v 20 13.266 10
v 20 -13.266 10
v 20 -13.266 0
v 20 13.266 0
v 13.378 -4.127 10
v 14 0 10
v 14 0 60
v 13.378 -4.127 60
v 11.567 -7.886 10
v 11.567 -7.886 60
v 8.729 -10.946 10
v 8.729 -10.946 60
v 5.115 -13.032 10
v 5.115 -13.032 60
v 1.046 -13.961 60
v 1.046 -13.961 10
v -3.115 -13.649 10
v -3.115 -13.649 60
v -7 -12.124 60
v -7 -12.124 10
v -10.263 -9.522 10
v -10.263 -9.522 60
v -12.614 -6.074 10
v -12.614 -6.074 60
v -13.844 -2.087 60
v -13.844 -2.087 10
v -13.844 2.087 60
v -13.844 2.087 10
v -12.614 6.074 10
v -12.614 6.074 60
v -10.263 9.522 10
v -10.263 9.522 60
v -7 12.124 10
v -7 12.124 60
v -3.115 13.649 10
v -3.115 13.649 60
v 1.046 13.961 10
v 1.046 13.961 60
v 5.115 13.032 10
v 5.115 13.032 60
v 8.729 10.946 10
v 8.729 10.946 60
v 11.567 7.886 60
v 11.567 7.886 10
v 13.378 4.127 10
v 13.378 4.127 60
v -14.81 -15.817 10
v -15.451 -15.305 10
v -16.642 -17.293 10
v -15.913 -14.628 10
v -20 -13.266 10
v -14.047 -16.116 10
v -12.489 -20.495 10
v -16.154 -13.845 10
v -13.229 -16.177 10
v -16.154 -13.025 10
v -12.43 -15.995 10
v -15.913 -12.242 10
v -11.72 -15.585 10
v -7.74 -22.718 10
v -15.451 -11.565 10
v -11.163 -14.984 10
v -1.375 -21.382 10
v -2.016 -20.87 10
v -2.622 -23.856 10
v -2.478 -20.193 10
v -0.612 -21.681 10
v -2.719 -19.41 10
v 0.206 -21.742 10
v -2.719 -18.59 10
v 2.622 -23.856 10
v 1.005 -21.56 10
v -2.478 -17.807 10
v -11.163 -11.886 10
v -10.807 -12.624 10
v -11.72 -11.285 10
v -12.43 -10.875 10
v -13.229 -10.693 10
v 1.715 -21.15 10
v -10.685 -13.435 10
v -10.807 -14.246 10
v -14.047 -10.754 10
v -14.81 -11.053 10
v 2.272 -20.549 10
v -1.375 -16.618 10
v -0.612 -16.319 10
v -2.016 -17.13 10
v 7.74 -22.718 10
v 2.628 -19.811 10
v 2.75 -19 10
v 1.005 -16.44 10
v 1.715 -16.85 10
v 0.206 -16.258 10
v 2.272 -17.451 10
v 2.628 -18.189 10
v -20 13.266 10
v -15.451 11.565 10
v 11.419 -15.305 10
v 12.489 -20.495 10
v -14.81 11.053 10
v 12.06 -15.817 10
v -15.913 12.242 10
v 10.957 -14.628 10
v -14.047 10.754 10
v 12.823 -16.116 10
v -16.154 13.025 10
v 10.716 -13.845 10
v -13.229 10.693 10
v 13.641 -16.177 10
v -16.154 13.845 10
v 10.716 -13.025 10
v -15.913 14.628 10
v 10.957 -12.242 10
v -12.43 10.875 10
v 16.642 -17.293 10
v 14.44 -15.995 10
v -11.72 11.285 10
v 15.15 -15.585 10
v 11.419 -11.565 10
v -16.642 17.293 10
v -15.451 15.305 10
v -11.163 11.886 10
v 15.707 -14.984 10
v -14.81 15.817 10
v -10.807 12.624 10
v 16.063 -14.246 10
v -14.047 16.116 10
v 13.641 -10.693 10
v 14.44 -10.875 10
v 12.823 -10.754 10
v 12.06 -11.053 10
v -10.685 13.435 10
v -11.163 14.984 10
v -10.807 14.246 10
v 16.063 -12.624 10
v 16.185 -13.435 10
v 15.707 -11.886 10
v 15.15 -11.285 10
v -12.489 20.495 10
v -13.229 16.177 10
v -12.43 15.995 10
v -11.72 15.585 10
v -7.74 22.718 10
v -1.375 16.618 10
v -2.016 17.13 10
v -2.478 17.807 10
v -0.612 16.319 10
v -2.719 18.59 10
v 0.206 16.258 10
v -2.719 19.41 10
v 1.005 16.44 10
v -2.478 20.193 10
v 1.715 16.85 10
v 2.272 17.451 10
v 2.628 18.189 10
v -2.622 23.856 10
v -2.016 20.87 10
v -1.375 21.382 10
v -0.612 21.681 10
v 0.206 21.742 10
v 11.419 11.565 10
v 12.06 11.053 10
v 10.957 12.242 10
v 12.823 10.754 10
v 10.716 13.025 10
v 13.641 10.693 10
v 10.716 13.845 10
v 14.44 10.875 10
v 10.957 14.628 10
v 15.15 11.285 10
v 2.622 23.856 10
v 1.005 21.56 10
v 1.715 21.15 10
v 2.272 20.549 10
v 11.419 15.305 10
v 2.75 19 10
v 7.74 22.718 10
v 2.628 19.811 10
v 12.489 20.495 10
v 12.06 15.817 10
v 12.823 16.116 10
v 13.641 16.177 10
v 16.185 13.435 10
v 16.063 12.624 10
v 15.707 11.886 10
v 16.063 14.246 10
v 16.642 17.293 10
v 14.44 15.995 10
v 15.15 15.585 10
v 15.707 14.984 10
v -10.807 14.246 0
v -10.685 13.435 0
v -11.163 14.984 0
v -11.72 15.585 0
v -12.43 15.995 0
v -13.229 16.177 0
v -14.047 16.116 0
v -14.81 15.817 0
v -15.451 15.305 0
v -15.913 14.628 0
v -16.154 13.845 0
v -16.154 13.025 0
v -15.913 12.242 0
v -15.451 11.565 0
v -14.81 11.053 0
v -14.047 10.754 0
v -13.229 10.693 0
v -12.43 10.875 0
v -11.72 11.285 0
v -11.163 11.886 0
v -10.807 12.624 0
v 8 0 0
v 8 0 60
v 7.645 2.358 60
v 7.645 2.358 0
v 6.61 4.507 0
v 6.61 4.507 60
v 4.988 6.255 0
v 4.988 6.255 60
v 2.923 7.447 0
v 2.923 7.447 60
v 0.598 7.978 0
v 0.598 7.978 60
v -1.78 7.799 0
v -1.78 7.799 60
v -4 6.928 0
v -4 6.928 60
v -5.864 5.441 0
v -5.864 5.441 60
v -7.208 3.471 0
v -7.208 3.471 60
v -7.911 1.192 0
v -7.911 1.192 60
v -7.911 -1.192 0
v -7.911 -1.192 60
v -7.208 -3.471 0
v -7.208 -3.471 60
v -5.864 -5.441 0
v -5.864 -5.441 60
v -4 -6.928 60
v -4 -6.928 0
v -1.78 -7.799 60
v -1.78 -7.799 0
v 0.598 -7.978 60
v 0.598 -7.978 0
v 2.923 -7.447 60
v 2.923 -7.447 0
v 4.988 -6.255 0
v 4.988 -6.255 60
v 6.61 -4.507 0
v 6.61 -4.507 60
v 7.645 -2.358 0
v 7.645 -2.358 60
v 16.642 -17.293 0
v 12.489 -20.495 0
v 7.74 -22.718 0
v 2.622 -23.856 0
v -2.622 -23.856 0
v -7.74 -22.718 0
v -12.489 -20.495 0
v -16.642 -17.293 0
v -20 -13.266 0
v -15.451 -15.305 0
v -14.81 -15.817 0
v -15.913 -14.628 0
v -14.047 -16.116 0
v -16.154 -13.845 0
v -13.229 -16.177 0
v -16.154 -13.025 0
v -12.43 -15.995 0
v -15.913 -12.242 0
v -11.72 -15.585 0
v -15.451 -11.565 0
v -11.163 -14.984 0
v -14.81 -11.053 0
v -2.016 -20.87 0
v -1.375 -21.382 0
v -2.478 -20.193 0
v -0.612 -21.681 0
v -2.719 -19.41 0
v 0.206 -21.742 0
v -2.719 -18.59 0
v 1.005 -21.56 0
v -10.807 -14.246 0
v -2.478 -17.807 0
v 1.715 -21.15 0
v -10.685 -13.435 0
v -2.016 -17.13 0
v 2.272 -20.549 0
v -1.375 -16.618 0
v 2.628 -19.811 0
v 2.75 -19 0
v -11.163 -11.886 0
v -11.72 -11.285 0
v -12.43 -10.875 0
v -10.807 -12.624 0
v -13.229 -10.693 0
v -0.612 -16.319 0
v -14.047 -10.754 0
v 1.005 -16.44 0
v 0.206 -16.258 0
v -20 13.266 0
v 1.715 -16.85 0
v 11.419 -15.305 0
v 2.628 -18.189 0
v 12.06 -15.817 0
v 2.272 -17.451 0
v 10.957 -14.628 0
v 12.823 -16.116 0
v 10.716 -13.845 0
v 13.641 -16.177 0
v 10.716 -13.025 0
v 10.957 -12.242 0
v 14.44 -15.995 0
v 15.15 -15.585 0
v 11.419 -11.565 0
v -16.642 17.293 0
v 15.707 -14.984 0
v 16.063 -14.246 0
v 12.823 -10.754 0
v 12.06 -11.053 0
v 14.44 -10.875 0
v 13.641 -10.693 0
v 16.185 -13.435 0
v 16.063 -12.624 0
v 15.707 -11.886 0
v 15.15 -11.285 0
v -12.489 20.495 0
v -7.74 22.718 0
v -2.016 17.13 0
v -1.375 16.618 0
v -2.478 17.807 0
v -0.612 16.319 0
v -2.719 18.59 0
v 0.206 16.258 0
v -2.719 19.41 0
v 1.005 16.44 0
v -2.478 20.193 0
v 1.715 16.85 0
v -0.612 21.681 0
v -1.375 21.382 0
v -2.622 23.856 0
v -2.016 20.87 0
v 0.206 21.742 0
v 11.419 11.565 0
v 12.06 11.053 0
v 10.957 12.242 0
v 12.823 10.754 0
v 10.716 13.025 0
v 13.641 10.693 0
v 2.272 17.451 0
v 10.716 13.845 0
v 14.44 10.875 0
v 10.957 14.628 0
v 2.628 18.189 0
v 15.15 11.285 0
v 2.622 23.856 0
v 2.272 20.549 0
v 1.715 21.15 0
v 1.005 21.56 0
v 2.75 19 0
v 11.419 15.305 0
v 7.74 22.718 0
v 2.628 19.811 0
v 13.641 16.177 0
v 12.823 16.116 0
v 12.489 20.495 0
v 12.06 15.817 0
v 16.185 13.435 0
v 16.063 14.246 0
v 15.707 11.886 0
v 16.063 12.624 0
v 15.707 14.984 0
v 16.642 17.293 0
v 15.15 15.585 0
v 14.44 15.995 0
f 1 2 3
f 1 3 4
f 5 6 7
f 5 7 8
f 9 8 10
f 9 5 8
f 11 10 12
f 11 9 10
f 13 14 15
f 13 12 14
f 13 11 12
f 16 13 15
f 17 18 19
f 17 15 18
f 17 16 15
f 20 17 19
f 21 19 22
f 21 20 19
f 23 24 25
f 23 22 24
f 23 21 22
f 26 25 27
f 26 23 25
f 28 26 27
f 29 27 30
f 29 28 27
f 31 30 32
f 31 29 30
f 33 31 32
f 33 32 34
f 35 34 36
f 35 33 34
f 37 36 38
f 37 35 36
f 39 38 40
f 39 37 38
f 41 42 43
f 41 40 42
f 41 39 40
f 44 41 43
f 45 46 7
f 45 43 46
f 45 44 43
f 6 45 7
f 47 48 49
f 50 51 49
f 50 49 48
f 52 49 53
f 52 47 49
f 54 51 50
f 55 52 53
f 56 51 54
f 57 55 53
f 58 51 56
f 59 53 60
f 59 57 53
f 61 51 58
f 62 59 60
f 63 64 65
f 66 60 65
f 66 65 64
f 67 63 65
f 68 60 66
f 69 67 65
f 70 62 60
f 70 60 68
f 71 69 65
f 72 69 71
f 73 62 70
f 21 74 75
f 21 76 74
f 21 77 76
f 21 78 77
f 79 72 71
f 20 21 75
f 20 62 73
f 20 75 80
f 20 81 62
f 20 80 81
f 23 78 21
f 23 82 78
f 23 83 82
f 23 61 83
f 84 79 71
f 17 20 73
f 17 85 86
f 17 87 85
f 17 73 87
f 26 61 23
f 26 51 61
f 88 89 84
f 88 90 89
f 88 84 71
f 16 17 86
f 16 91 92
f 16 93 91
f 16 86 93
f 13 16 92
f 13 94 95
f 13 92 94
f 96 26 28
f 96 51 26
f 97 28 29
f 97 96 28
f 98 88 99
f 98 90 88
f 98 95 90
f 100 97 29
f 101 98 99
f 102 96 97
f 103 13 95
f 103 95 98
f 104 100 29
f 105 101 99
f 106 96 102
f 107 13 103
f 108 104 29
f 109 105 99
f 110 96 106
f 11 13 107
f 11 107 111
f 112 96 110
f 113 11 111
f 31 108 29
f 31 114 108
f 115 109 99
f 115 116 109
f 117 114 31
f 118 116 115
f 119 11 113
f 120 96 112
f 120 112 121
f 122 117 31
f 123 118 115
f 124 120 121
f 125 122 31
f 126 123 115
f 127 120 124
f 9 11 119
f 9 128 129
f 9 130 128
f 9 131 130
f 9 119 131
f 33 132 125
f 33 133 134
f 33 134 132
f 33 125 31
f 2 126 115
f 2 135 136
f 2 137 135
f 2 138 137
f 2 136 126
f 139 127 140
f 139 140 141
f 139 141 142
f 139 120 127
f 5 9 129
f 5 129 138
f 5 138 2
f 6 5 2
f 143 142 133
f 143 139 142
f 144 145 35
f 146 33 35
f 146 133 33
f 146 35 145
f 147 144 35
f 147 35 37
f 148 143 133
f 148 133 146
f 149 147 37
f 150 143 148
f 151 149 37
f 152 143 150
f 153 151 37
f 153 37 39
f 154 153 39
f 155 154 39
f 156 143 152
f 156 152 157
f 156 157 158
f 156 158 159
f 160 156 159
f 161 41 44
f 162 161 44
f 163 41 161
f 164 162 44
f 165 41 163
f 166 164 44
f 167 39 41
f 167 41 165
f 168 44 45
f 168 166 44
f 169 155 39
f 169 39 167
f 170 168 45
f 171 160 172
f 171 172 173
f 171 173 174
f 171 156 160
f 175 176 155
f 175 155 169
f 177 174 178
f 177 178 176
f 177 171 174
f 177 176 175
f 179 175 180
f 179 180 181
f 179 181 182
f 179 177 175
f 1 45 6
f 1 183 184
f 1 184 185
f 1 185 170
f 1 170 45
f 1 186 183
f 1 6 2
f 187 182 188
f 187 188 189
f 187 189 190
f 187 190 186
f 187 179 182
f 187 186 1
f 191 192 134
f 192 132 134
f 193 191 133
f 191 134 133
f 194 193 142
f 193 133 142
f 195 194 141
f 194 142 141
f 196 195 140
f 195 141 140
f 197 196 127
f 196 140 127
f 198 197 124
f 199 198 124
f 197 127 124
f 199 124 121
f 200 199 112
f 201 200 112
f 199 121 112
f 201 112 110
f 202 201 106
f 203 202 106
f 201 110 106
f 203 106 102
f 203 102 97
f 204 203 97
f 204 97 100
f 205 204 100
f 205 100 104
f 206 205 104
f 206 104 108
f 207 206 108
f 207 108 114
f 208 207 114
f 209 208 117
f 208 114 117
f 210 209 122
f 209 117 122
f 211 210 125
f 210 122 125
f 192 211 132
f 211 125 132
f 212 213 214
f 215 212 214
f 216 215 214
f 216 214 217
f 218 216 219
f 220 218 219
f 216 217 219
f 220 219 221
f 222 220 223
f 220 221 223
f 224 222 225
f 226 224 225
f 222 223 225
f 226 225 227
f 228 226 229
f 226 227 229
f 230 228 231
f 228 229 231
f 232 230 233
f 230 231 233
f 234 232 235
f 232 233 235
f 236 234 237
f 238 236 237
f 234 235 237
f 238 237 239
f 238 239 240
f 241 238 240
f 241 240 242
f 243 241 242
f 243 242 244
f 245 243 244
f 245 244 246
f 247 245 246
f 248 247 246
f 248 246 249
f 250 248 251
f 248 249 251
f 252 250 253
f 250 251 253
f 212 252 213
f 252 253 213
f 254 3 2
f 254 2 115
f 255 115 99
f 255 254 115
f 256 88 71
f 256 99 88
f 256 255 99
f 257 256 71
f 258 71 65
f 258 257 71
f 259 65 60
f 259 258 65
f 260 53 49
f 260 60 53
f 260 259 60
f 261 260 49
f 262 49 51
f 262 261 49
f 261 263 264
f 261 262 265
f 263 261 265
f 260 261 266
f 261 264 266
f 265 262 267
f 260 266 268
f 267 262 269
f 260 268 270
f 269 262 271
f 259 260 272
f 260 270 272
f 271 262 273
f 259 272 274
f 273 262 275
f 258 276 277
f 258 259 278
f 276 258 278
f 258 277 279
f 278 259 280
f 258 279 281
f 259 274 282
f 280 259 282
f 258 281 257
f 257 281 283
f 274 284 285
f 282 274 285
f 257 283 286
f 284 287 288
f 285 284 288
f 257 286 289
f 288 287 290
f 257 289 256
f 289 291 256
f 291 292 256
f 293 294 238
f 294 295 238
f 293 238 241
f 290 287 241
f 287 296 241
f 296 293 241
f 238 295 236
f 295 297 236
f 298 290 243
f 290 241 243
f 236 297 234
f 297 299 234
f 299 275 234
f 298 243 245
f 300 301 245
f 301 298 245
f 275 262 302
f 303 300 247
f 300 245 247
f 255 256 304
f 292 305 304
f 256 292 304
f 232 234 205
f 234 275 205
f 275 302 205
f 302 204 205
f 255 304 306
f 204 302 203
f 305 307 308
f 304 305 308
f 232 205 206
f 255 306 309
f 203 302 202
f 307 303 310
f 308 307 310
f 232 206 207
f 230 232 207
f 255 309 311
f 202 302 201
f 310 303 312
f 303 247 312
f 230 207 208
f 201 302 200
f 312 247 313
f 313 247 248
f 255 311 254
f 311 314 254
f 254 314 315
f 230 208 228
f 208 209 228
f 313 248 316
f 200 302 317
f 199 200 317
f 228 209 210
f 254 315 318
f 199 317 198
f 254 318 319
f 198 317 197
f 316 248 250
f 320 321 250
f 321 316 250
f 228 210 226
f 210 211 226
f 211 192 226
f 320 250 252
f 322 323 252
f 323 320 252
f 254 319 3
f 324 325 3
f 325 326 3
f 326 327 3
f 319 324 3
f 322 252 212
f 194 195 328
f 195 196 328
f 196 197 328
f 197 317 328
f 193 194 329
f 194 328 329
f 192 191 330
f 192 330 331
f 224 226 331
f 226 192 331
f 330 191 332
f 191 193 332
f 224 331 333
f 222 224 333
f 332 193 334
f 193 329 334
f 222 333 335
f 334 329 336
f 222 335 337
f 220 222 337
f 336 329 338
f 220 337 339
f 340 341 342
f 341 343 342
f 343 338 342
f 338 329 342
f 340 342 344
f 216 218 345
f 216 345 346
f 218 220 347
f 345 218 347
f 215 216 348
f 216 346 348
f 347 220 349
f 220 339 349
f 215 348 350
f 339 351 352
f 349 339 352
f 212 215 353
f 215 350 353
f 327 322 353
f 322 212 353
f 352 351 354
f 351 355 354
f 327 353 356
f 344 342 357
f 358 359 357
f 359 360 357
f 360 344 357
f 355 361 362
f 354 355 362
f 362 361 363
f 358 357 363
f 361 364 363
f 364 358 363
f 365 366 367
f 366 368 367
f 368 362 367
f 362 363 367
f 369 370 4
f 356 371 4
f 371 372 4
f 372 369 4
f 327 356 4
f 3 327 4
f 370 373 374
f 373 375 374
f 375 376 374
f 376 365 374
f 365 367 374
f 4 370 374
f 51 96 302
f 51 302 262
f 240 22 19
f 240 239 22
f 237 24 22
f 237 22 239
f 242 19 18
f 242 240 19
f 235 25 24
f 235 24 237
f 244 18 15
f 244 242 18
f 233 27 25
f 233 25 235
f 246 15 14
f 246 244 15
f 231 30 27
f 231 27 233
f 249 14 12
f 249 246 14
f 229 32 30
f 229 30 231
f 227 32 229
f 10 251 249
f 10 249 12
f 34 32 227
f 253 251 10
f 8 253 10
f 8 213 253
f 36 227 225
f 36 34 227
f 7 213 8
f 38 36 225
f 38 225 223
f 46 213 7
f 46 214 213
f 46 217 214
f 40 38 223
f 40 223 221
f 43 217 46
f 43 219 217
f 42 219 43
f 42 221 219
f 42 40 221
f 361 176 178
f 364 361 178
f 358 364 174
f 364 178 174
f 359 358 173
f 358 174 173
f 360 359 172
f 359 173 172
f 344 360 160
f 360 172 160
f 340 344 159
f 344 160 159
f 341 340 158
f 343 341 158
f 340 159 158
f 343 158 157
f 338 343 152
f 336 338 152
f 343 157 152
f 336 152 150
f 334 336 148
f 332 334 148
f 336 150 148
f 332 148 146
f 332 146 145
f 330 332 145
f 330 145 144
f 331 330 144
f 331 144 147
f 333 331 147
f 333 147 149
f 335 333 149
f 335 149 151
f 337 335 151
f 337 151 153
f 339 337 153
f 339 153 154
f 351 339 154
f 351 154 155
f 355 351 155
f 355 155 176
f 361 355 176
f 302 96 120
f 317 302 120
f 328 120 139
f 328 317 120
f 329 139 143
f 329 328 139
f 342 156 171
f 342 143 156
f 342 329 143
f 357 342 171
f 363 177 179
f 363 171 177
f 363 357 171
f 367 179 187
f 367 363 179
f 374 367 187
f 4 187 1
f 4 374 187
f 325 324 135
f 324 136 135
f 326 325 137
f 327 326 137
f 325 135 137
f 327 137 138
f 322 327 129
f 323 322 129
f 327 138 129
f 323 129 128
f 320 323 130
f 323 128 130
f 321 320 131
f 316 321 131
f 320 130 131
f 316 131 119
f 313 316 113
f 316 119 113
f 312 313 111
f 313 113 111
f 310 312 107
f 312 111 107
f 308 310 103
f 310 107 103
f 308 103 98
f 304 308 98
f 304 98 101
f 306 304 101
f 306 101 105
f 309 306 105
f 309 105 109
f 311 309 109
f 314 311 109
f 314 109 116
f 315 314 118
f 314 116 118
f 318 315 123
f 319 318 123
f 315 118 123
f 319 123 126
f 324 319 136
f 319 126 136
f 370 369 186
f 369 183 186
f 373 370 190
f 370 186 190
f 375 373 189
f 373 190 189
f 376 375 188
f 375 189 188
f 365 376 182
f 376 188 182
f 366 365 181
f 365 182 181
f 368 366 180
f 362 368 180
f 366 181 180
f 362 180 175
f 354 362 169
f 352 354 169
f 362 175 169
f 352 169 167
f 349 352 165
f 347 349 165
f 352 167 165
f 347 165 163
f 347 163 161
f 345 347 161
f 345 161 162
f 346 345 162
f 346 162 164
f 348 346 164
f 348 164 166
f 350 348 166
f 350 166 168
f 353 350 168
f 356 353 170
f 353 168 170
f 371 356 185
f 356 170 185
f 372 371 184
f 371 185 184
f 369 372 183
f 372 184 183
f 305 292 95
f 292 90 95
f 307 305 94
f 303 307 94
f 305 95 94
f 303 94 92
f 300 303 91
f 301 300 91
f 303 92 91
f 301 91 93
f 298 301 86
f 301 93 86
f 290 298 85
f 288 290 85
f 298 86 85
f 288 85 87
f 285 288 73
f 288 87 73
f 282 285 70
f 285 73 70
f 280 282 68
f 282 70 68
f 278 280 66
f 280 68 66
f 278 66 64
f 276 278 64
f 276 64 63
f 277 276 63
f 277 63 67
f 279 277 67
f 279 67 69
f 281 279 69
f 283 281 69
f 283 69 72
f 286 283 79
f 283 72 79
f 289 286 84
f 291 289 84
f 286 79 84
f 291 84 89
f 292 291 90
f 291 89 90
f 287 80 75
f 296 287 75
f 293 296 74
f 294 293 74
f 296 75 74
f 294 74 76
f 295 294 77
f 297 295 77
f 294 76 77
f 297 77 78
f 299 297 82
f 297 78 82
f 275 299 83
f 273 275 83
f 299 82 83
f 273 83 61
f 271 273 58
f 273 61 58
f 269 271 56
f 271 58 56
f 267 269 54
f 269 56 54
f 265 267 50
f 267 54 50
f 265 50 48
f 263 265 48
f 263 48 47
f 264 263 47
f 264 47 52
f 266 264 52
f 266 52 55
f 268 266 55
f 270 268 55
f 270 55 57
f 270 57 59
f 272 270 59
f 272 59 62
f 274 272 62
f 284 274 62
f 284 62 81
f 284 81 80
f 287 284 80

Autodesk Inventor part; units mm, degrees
ref_plane "YZ Plane" through (0, 0, 0) normal (1, 0, 0) x (0, 1, 0)
ref_plane "XZ Plane" through (0, 0, 0) normal (0, 1, 0) x (-1, 0, 0)
ref_plane "XY Plane" through (0, 0, 0) normal (0, 0, 1) x (1, 0, 0)
sketch "Szkic1" plane through (0, 0, 0) normal (0, 0, 1) x (1, 0, 0)
  circle A0 centre (0, 0) radius 24
  dimension "d0" = 48
extrude "Wyciągnięcie proste1" add sketch "Szkic1" along normal blind 10
sketch "Szkic2" plane through (0, 0, 10) normal (0, 0, 1) x (1, 0, 0)
  circle A0 centre (0, 0) radius 14
  dimension "d3" = 28
extrude "Wyciągnięcie proste2" add sketch "Szkic2" along normal blind 50
sketch "Szkic3" plane through (0, 0, 60) normal (0, 0, 1) x (1, 0, 0)
  circle A0 centre (0, 0) radius 8
  dimension "d6" = 16
extrude "Wyciągnięcie proste3" cut sketch "Szkic3" against normal through all
sketch "Szkic4" plane through (0, 0, 10) normal (0, 0, 1) x (1, 0, 0)
  line L0 (-34.1509, 26.2264) -> (-20, 26.2264)
  line L1 (-20, 26.2264) -> (-20, -20.7547)
  line L2 (-20, -20.7547) -> (-34.1509, -20.7547)
  line L3 (-34.1509, -20.7547) -> (-34.1509, 26.2264)
  line L4 (20, 30.566) -> (32.0755, 30.566)
  line L5 (32.0755, 30.566) -> (32.0755, -32.8302)
  line L6 (32.0755, -32.8302) -> (20, -32.8302)
  line L7 (20, -32.8302) -> (20, 30.566)
  point P0 (0, 0)
  dimension "d9" = 40
  dimension "d10" = 20
extrude "Wyciągnięcie proste4" cut sketch "Szkic4" against normal blind 40
sketch "Szkic5" plane through (0, 0, 10) normal (0, 0, 1) x (1, 0, 0)
  circle A0 centre (0, 0) radius 19
  circle A1 centre (0, 19) radius 2.75
  circle A2 centre (13.435, 13.435) radius 2.75
  circle A3 centre (-13.435, 13.435) radius 2.75
  line L0 (0, 0) -> (-30.3885, 30.3885)
  line L1 (0, 0) -> (37.6377, 37.6377)
  line L2 (0, 0) -> (34.9843, 0)
  dimension "d13" = 38
  dimension "d14" = 5.5
  dimension "d15" = 5.5
  dimension "d16" = 5.5
  dimension "d17" = 45
  dimension "d18" = 90
extrude "Wyciągnięcie proste5" cut sketch "Szkic5" against normal blind 40 contours A2 L1 A0 | A0 L1 A2 | A3 L0 A0 | A0 L0 A3 | L1 A2 A0 | A0 A2 L1 | L0 A3 A0 | A0 A3 L0 | A1 A0 | A0 A1
mirror "Odbij1" about plane through (0, 0, 0) normal (0, 1, 0) of "Wyciągnięcie proste5"
properties part number "Cartesian1_BallNut" material "Stal, stopowa"
